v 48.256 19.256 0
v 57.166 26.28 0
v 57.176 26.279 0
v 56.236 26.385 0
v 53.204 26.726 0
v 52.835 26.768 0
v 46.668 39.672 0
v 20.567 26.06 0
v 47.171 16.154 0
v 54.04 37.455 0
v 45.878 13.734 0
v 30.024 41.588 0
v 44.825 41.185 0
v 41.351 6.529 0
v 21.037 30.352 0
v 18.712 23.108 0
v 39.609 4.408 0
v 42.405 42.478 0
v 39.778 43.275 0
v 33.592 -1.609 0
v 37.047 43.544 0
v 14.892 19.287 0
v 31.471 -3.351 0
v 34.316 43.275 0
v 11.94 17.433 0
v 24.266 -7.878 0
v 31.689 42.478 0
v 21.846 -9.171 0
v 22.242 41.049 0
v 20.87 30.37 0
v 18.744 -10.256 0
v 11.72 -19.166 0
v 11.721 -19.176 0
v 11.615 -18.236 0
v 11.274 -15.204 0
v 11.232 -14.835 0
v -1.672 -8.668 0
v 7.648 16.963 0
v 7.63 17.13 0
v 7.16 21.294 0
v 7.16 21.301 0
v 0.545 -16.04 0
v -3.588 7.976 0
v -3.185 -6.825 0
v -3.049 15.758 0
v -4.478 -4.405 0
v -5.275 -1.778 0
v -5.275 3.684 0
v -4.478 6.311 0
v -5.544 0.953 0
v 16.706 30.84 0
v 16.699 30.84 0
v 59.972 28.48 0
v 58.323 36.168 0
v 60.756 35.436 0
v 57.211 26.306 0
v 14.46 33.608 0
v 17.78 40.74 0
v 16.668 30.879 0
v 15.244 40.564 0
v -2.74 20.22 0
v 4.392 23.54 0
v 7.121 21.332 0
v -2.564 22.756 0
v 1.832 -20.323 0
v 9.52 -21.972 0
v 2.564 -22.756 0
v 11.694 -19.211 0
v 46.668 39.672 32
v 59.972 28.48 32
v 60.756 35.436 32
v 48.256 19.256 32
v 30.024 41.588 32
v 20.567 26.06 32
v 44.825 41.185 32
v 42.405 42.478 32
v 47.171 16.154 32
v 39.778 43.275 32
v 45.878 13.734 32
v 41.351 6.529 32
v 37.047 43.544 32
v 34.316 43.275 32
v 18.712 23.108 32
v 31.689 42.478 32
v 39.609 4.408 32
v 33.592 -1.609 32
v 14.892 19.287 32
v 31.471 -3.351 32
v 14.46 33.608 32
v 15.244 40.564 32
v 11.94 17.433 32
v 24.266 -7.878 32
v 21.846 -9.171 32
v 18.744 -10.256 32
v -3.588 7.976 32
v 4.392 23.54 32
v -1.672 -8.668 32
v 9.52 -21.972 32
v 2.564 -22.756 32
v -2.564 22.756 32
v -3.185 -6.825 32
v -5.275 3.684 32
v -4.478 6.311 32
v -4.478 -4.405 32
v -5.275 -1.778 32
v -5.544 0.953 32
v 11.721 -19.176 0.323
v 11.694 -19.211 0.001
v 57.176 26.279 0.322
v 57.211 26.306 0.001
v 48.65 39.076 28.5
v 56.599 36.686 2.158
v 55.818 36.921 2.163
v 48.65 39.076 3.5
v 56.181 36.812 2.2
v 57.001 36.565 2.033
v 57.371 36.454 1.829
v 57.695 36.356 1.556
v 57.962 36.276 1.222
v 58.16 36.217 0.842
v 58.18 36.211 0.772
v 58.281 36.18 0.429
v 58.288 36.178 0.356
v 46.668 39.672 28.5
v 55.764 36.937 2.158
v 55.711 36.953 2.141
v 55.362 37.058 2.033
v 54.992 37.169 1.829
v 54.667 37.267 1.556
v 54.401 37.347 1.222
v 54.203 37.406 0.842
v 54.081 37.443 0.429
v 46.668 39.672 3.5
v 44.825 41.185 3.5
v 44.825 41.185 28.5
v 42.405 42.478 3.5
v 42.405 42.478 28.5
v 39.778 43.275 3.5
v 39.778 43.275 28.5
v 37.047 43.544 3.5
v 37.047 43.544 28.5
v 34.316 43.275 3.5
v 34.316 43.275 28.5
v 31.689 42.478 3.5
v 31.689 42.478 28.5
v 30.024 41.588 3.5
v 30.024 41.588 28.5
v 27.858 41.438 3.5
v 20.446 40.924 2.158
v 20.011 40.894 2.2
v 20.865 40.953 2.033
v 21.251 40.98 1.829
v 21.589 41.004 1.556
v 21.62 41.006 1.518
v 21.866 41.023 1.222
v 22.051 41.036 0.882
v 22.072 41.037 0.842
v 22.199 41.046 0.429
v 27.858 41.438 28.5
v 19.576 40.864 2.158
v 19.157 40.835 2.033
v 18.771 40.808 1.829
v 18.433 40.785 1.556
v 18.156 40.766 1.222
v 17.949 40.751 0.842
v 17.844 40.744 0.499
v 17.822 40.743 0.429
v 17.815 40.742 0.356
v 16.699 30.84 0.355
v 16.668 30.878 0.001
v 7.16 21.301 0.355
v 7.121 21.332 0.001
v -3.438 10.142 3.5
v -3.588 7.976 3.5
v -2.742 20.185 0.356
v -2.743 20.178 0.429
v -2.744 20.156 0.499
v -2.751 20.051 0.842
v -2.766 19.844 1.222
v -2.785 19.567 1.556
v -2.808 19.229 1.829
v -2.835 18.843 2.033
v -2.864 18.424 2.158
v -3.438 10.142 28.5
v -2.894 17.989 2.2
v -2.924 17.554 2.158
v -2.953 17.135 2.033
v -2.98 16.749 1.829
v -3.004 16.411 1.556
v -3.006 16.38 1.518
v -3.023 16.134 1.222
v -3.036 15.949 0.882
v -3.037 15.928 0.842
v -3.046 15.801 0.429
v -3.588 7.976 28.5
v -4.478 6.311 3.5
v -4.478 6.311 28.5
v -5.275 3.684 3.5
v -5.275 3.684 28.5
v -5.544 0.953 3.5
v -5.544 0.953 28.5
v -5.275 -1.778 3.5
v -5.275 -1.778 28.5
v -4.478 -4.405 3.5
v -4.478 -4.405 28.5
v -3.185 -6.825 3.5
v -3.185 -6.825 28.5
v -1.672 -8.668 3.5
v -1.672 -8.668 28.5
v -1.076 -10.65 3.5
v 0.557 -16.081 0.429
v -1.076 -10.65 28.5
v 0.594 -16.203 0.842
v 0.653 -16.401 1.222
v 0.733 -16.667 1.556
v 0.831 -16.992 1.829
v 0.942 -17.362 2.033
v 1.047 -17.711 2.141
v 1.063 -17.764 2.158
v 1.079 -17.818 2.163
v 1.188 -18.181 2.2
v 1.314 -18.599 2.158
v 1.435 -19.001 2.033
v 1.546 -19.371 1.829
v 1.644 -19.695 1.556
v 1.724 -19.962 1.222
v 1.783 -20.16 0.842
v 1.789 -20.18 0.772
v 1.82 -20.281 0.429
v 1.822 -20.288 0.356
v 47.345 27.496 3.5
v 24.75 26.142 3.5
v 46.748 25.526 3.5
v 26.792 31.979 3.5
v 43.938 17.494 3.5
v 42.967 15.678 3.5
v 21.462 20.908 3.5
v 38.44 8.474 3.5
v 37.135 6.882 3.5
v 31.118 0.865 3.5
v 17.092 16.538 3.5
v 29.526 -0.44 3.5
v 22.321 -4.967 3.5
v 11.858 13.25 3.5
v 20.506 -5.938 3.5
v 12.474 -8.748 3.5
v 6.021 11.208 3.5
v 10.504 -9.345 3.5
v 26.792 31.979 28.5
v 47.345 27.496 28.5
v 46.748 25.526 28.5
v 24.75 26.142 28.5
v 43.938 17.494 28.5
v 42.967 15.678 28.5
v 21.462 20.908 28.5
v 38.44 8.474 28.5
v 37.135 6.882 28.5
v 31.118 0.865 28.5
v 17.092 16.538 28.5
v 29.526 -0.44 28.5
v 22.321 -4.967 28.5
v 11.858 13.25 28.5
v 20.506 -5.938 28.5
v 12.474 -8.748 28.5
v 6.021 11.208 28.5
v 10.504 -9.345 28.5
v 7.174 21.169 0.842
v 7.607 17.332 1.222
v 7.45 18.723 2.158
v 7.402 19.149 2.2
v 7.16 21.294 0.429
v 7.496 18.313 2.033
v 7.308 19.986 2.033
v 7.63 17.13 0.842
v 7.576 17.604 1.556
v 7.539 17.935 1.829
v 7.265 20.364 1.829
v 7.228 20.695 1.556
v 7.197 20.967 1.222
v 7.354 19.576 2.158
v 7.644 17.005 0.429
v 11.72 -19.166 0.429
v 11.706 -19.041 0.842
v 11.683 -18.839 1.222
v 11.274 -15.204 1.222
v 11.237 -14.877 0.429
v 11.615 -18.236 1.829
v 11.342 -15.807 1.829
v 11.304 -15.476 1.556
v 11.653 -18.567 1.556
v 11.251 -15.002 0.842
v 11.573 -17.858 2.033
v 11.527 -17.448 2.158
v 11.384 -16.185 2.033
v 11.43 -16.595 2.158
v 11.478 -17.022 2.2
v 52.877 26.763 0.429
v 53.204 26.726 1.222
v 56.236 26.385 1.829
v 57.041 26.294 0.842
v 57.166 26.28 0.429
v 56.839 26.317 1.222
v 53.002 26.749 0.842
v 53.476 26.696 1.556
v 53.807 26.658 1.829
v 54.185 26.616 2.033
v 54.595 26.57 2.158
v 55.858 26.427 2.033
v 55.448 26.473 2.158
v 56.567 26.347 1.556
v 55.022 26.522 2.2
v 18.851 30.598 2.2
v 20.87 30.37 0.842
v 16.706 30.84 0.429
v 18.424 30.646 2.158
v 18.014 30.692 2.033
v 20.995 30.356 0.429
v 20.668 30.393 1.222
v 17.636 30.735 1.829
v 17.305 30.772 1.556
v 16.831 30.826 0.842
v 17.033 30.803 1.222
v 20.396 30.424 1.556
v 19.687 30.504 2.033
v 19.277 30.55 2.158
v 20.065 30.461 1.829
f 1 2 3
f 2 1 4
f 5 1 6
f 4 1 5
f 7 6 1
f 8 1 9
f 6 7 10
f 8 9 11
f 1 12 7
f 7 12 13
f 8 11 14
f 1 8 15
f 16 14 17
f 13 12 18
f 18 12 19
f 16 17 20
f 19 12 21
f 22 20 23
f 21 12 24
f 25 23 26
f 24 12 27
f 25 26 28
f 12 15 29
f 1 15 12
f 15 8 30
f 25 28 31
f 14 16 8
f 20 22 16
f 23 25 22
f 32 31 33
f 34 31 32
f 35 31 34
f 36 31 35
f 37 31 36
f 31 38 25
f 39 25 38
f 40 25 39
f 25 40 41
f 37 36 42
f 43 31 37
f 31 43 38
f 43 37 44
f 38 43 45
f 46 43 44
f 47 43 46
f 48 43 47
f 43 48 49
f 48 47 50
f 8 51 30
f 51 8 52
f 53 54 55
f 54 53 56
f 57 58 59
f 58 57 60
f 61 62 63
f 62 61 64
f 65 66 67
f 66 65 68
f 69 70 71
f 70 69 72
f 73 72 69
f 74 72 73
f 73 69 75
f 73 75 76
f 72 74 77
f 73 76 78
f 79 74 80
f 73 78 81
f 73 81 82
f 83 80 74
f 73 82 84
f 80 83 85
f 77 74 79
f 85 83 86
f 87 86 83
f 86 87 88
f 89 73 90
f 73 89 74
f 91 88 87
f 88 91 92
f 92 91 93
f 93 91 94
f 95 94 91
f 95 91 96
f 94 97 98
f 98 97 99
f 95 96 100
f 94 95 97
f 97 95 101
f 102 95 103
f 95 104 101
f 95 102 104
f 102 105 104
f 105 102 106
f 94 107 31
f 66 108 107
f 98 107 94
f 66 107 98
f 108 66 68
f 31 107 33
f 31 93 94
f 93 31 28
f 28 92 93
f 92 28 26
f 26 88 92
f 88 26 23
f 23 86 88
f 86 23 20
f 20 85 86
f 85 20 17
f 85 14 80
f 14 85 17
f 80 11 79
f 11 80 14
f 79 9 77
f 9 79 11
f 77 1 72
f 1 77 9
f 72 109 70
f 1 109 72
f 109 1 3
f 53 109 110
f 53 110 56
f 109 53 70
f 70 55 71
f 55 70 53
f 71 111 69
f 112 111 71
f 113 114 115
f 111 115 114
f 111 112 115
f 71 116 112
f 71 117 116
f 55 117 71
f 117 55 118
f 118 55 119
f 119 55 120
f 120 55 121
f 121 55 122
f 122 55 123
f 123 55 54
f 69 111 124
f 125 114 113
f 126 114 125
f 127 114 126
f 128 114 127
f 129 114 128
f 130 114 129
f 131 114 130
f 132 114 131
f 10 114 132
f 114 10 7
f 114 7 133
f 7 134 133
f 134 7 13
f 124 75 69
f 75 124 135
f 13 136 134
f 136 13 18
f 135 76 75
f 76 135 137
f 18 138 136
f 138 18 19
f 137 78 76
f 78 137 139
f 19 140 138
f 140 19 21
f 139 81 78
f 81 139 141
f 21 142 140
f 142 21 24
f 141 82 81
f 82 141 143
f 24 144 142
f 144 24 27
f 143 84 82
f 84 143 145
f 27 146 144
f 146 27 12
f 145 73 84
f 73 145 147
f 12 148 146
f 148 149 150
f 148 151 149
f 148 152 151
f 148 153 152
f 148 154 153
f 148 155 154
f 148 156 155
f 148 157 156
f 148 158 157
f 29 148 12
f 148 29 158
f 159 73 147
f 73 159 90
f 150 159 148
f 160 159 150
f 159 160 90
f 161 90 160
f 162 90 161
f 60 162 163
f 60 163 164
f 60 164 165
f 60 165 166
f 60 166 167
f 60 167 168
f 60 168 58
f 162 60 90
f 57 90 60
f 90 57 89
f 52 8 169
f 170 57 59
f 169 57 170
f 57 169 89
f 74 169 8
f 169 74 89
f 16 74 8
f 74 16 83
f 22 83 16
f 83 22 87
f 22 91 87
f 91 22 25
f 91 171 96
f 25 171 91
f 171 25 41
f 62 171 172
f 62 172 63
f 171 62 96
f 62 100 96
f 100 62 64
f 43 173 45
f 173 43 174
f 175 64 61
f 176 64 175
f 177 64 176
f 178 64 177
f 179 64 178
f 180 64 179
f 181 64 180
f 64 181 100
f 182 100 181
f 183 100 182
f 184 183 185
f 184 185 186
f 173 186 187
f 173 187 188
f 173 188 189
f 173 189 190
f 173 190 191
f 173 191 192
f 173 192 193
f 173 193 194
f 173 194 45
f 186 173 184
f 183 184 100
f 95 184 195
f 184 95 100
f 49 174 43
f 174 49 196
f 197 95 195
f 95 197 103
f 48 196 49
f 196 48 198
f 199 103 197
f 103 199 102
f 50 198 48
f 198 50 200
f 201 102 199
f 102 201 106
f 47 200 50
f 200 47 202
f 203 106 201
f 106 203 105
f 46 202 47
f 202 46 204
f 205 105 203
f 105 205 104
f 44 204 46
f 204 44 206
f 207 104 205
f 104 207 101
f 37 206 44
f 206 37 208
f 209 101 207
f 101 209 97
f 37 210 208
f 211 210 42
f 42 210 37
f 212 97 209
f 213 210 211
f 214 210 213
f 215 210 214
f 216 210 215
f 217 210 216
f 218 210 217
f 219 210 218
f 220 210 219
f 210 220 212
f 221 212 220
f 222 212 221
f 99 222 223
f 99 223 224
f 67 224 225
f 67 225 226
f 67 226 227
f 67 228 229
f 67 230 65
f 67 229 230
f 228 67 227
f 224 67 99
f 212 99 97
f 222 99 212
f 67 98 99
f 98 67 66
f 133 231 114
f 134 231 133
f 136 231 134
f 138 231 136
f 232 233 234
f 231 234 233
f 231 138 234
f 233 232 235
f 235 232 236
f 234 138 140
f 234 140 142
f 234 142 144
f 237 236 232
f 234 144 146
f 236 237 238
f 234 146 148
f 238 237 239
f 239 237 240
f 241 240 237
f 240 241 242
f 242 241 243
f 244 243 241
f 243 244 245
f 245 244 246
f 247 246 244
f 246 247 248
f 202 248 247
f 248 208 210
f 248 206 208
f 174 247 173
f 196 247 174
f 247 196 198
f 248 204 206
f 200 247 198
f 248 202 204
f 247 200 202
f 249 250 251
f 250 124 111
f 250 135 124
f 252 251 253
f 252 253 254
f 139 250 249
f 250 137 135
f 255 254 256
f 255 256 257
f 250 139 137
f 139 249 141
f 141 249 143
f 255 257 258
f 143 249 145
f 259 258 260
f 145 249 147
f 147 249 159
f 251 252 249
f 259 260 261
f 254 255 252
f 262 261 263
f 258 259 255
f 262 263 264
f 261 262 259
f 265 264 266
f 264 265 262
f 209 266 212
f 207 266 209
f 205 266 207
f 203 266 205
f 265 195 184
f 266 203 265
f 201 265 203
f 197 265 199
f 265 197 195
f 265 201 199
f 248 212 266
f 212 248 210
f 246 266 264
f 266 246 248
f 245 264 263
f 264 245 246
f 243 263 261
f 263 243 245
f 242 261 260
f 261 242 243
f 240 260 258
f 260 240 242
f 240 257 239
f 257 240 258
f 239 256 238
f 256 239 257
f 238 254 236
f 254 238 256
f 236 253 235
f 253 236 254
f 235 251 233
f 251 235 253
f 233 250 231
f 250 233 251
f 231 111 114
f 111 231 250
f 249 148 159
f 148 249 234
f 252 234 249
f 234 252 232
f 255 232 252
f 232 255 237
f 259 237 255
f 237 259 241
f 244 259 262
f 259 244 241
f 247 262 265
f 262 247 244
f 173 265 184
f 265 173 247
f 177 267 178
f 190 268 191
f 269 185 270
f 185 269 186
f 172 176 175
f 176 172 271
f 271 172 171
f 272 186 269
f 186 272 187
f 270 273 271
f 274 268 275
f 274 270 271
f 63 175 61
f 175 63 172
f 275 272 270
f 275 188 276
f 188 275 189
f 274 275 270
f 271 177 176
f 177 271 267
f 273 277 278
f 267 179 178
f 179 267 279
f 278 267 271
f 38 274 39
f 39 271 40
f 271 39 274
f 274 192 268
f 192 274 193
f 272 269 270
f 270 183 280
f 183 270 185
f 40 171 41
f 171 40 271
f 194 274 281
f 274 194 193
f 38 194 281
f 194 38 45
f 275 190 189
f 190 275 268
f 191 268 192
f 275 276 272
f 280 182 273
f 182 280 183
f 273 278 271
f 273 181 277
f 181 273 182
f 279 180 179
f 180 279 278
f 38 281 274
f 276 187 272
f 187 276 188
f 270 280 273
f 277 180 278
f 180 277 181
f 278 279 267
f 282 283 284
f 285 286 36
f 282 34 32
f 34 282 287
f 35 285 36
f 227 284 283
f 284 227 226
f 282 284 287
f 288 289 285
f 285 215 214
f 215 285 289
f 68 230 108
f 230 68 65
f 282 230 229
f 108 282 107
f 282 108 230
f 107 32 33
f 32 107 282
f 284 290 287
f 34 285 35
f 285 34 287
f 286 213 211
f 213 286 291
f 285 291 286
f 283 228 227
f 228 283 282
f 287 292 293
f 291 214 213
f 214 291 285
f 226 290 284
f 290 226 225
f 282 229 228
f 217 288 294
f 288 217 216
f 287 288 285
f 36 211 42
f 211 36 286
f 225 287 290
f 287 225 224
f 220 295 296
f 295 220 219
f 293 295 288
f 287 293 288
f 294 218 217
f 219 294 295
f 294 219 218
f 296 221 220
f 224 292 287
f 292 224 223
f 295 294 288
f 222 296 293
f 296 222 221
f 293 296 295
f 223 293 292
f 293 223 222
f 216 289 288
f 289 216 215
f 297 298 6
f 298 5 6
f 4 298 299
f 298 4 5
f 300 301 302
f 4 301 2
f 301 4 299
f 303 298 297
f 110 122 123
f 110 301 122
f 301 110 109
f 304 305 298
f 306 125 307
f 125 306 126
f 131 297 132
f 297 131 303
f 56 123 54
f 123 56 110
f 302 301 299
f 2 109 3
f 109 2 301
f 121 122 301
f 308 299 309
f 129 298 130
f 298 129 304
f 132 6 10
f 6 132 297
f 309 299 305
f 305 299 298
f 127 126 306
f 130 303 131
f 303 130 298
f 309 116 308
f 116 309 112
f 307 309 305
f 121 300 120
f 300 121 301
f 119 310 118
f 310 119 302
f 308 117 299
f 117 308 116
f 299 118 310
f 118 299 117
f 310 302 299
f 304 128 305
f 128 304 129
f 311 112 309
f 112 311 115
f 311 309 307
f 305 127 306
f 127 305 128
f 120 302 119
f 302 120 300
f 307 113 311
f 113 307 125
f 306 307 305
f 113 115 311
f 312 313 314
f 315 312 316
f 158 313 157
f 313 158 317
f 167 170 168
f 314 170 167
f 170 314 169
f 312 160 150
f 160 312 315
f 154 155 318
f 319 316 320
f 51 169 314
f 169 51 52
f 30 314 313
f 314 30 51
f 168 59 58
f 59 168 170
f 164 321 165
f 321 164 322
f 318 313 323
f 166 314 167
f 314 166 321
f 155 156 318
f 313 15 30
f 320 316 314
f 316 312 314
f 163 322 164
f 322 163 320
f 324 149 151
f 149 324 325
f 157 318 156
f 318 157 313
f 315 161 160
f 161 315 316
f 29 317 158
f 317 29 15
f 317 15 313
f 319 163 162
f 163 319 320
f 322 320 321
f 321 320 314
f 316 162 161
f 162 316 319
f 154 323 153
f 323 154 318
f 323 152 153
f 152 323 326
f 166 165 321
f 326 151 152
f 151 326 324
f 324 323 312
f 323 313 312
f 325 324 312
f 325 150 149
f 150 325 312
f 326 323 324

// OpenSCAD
$fn = 32;

// ----------------------------------------------------------------------
// Air duct: 28 mm duct, 3.5 mm wall, 32 mm across
// ----------------------------------------------------------------------

// --- parameters (mm) ---
duct_r = 14;              // duct core radius
duct_d = 28;              // duct core diameter
wall = 3.5;               // duct wall thickness
height = 32;              // duct width (extrusion height)
port_r = 22.9;            // port flange half width
port_d = 45.8;            // port flange width
port_t = 7;               // port flange thickness
bolt_d = 4.4;             // port bolt holes
bolt_offset = 18.2;       // bolt hole offset from the port axis

difference() {
  /* outer hull chain: tube with a flat flange plate at every port */
  linear_extrude(height = 32) {
    hull() {
      polygon([[2.564, -22.756], [-2.564, 22.756], [4.392, 23.54], [9.52, -21.972]]);
      translate([9.937, 1.12]) circle(r = 14);
    }
    hull() {
      translate([9.937, 1.12]) circle(r = 14);
      translate([8.456, 0.953]) circle(r = 14);
    }
    hull() {
      translate([8.456, 0.953]) circle(r = 14);
      translate([16.488, 3.763]) circle(r = 14);
    }
    hull() {
      translate([16.488, 3.763]) circle(r = 14);
      translate([23.693, 8.29]) circle(r = 14);
    }
    hull() {
      translate([23.693, 8.29]) circle(r = 14);
      translate([29.71, 14.307]) circle(r = 14);
    }
    hull() {
      translate([29.71, 14.307]) circle(r = 14);
      translate([34.237, 21.512]) circle(r = 14);
    }
    hull() {
      translate([34.237, 21.512]) circle(r = 14);
      translate([37.047, 29.544]) circle(r = 14);
    }
    hull() {
      translate([37.047, 29.544]) circle(r = 14);
      translate([36.88, 28.063]) circle(r = 14);
    }
    hull() {
      translate([36.88, 28.063]) circle(r = 14);
      polygon([[15.244, 40.564], [60.756, 35.436], [59.972, 28.48], [14.46, 33.608]]);
    }
  }
  /* air passage: the same chain inset by the wall, 5 mm proud of the ports */
  translate([0, 0, 3.5]) linear_extrude(height = 25) {
    hull() {
      translate([-4.969, -0.56]) circle(r = 10.5);
      translate([8.456, 0.953]) circle(r = 10.5);
    }
    hull() {
      translate([8.456, 0.953]) circle(r = 10.5);
      translate([16.488, 3.763]) circle(r = 10.5);
    }
    hull() {
      translate([16.488, 3.763]) circle(r = 10.5);
      translate([23.693, 8.29]) circle(r = 10.5);
    }
    hull() {
      translate([23.693, 8.29]) circle(r = 10.5);
      translate([29.71, 14.307]) circle(r = 10.5);
    }
    hull() {
      translate([29.71, 14.307]) circle(r = 10.5);
      translate([34.237, 21.512]) circle(r = 10.5);
    }
    hull() {
      translate([34.237, 21.512]) circle(r = 10.5);
      translate([37.047, 29.544]) circle(r = 10.5);
    }
    hull() {
      translate([37.047, 29.544]) circle(r = 10.5);
      translate([38.56, 42.969]) circle(r = 10.5);
    }
  }
  translate([0, 0]) rotate([0, 0, -83.57]) translate([-18.2, -2.5]) rotate([-90, 0, 0]) cylinder(h = 12, d = 4.4);
  translate([0, 0]) rotate([0, 0, -83.57]) translate([18.2, -2.5]) rotate([-90, 0, 0]) cylinder(h = 12, d = 4.4);
  translate([38, 38]) rotate([0, 0, 173.57]) translate([-18.2, -2.5]) rotate([-90, 0, 0]) cylinder(h = 12, d = 4.4);
  translate([38, 38]) rotate([0, 0, 173.57]) translate([18.2, -2.5]) rotate([-90, 0, 0]) cylinder(h = 12, d = 4.4);
}
